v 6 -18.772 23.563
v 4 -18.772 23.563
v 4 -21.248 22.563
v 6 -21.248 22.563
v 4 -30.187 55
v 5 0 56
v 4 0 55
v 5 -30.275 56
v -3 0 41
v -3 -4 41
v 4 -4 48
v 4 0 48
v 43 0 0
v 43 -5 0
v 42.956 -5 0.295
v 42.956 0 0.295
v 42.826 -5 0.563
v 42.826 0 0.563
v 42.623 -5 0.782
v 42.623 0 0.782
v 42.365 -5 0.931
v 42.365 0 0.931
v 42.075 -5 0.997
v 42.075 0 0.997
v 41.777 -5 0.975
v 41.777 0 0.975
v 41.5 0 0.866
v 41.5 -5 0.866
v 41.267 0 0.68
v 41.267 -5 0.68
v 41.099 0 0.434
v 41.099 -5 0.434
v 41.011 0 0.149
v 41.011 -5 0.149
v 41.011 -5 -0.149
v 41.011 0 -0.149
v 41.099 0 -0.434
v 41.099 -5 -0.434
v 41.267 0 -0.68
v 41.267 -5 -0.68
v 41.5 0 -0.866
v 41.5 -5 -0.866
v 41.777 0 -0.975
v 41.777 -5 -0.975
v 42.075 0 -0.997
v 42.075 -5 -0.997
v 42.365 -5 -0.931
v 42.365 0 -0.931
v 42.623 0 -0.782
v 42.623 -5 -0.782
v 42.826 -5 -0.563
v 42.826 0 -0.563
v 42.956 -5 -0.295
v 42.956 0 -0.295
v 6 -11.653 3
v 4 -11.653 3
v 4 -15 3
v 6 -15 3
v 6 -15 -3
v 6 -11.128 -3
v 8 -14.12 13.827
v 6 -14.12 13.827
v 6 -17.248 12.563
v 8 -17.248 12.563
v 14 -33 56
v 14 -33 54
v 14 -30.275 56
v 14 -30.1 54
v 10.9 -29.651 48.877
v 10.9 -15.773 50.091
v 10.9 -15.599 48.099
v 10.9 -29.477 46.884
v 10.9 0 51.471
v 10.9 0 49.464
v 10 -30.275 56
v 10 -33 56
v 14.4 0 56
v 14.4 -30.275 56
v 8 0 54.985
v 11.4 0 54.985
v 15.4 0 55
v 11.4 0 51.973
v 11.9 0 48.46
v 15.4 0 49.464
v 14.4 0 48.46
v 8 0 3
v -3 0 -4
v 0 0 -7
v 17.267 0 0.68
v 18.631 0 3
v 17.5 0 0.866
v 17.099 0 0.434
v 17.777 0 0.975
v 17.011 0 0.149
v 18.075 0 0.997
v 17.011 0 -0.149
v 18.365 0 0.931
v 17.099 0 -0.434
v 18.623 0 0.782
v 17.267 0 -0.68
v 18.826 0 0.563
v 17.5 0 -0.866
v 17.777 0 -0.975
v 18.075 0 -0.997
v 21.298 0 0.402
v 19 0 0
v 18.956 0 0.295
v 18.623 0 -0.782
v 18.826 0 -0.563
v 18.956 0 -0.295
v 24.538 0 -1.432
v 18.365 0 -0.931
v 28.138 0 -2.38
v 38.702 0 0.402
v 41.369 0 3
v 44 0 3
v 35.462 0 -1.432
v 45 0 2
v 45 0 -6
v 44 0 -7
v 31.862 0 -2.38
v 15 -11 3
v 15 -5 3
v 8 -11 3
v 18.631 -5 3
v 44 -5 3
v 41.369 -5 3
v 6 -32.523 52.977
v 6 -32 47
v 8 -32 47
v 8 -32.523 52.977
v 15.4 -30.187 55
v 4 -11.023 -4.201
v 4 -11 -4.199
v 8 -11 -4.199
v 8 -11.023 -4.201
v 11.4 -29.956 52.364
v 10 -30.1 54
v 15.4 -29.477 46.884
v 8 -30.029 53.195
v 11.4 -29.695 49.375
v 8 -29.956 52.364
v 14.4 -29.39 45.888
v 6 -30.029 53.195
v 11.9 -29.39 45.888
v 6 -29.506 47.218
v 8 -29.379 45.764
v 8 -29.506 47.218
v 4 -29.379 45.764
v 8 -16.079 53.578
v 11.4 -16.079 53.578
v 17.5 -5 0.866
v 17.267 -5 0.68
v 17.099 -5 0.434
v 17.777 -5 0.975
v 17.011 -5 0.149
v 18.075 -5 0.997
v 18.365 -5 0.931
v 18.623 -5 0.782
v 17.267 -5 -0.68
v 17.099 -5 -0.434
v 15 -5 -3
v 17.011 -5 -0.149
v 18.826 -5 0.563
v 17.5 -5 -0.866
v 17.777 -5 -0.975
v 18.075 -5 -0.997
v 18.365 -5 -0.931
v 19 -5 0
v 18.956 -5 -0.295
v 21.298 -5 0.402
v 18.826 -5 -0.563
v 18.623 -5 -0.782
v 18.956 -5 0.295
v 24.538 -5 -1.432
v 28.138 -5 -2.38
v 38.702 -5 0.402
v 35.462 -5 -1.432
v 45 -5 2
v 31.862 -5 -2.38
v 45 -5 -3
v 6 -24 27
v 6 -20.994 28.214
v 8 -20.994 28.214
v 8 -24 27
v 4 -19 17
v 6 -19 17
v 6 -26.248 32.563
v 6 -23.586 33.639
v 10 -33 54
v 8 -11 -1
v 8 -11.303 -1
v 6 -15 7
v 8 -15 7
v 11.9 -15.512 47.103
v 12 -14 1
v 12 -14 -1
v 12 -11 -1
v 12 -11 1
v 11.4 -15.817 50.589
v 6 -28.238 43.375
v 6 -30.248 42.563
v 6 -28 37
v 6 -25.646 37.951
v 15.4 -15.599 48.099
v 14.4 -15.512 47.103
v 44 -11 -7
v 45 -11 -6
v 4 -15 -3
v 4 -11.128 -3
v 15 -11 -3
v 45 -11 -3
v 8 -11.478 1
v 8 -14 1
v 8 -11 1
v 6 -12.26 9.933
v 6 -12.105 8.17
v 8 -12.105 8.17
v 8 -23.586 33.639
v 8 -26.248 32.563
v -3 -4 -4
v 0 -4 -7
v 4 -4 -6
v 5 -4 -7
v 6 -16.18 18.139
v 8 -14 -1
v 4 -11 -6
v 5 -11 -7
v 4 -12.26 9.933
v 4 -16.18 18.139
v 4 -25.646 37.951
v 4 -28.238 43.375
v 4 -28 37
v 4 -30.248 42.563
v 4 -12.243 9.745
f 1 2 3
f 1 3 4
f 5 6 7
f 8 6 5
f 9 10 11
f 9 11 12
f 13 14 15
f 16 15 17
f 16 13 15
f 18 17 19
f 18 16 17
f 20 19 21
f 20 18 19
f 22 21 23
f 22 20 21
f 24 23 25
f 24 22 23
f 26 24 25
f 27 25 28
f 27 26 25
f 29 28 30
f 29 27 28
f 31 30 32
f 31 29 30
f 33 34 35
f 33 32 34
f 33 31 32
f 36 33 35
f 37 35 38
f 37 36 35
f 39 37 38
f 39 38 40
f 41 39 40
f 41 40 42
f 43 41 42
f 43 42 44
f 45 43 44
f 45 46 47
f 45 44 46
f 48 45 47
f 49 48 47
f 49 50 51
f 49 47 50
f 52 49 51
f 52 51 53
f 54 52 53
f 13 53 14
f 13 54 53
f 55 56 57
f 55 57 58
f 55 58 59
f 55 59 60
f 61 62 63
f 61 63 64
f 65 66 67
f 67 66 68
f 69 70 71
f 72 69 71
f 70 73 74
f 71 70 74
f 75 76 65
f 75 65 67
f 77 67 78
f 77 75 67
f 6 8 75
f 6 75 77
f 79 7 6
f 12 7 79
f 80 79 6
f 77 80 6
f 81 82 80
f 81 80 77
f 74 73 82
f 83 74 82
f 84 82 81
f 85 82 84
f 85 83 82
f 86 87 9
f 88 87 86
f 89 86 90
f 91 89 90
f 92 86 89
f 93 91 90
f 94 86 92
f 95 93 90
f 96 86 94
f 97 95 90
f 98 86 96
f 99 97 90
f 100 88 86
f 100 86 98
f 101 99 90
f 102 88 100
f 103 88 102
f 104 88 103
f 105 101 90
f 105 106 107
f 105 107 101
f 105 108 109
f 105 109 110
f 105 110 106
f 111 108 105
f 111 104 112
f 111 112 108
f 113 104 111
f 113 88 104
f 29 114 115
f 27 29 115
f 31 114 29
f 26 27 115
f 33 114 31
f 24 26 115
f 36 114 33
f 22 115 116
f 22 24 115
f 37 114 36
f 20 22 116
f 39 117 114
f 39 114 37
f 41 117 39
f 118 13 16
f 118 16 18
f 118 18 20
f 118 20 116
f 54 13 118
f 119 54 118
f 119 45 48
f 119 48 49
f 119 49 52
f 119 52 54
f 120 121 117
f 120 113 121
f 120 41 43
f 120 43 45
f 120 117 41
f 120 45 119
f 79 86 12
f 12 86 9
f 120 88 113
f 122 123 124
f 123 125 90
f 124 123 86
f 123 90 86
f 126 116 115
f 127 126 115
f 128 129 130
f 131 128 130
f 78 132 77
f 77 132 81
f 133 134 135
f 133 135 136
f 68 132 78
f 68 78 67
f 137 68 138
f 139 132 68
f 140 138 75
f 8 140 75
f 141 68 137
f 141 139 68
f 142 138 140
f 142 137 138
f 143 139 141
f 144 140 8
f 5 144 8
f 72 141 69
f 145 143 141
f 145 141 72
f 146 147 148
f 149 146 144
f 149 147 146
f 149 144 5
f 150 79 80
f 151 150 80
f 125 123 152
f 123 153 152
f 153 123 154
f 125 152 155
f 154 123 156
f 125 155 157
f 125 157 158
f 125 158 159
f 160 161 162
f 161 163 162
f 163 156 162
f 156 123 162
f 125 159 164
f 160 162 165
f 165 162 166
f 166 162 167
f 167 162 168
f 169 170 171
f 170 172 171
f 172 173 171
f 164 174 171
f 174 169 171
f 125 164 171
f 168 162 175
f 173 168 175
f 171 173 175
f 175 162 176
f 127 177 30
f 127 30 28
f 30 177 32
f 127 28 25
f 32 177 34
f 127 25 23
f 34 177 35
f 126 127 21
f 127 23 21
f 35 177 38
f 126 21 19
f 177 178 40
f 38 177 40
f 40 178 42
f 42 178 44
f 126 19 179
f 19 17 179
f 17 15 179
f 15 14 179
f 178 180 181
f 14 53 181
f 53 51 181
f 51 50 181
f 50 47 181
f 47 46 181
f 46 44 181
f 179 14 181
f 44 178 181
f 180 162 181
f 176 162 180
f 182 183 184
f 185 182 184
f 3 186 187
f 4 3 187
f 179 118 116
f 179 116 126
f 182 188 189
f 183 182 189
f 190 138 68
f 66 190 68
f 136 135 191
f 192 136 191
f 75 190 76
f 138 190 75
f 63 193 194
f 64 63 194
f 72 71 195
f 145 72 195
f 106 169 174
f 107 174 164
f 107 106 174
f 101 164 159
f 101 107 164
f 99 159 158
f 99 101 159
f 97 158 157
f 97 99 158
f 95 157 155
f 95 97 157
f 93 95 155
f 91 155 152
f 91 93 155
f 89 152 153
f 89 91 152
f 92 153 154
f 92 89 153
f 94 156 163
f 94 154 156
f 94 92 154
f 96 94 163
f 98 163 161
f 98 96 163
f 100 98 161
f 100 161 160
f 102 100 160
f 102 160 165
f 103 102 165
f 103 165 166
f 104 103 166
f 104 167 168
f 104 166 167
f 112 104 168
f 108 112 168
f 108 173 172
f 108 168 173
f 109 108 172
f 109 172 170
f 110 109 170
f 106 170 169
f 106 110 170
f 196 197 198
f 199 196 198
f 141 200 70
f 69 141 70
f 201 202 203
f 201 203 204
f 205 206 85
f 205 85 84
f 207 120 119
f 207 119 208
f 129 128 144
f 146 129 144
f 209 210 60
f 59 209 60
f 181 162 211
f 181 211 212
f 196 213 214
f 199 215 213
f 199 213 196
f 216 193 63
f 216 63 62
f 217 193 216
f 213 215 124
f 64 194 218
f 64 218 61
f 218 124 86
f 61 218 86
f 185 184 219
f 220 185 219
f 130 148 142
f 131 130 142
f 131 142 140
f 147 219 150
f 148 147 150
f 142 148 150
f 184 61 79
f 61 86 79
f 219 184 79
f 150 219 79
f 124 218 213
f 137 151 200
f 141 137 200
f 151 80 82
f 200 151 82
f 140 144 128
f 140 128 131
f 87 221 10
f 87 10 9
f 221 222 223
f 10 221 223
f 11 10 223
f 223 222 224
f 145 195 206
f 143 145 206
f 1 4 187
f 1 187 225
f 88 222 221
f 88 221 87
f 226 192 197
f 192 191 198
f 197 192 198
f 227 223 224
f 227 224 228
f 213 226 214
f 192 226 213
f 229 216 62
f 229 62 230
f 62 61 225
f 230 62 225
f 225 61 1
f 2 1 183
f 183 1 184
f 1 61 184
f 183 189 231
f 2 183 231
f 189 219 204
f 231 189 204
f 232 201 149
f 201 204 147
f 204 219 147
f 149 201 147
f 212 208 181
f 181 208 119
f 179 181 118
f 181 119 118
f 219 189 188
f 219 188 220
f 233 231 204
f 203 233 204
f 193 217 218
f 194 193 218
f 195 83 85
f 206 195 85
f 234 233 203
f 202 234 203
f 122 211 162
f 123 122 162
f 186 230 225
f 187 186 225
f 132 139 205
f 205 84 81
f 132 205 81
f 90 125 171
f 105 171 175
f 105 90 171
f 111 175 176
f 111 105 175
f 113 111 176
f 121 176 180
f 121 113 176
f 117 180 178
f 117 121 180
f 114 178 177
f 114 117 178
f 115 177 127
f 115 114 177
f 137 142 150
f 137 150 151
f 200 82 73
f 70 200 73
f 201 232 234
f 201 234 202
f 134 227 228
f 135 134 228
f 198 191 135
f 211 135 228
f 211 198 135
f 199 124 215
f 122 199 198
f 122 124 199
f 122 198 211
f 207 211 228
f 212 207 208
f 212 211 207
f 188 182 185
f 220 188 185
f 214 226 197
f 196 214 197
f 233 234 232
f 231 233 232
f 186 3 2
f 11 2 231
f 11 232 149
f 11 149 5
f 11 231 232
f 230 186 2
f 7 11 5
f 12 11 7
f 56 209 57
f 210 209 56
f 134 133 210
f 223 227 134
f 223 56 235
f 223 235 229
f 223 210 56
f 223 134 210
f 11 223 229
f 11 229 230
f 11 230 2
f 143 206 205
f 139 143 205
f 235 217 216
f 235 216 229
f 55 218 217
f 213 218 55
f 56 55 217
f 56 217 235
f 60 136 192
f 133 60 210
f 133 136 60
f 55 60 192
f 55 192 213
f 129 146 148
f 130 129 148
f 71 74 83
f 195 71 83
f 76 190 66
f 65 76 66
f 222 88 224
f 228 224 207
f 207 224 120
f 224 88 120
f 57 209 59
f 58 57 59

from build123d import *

# Parameters (mm, degrees)
BOX012_W             = 10
BOX012_H             = 4
BOX012_DEPTH         = 55
CHAMFER008_SIZE      = 7
CHAMFER009_SIZE      = 3
BOX005_W             = 4
BOX005_H             = 5
BOX005_DEPTH         = 2
BOX010_W             = 2
BOX010_H             = 5
BOX010_DEPTH         = 6
BOX010_ROLL_ANGLE    = 5
BOX007_W             = 2
BOX007_H             = 5
BOX007_DEPTH         = 6
BOX007_ROLL_ANGLE    = 22.0000000001
BOX011_W             = 4
BOX011_H             = 5
BOX011_DEPTH         = 2
BOX006_W             = 2
BOX006_H             = 5
BOX006_DEPTH         = 6
BOX009_W             = 2
BOX009_H             = 5
BOX009_DEPTH         = 6
BOX009_ROLL_ANGLE    = 22.0000000001
BOX008_W             = 2
BOX008_H             = 5
BOX008_DEPTH         = 6
BOX008_ROLL_ANGLE    = 22.0000000001
BOX004_W             = 2
BOX004_H             = 5
BOX004_DEPTH         = 6
BOX004_ROLL_ANGLE    = 22.0000000001
SKETCH002_W          = 34
SKETCH002_H          = 4
PAD001_DEPTH         = 30
EXTRUSION008_DEPTH   = 13.9308213426
BOX003_W             = 13
BOX003_H             = 10
BOX003_DEPTH         = 60
FACE006_W            = 8.14
FACE006_H            = 69.180787832
EXTRUSION006_DEPTH   = 0.4604923972
EXTRUSION005_DEPTH   = 8.14
FACE003_W            = 4
FACE003_H            = 14
EXTRUSION003_DEPTH   = 3.51
FACE004_W            = 3.51
FACE004_H            = 4
EXTRUSION004_DEPTH   = 69.180787832
FACE007_W            = 4
FACE007_H            = 69.180787832
EXTRUSION007_DEPTH   = 0.4131433628
FACE002_W            = 10
FACE002_H            = 4
EXTRUSION002_DEPTH   = 14
EXTRUSION_DEPTH      = 10
EXTRUSION001_DEPTH   = 10
FUSION001_ROLL_ANGLE = 5.0006445976
BOX002_W             = 13
BOX002_H             = 13
BOX002_DEPTH         = 49
BOX001_W             = 15
BOX001_H             = 11
BOX001_DEPTH         = 49
BOX_W                = 31
BOX_H                = 18
BOX_DEPTH            = 14
CYLINDER_R           = 14.5
CYLINDER_DEPTH       = 13
CYLINDER_ROLL_ANGLE  = 90.0000000001
SKETCH_R             = 1
PAD_DEPTH            = 11
CHAMFER_SIZE         = 1
CHAMFER001_SIZE      = 1
CHAMFER002_SIZE      = 1
CHAMFER003_SIZE      = 1
CHAMFER004_SIZE      = 1
CHAMFER005_SIZE      = 1
CHAMFER006_SIZE      = 1
EXTRUSION009_DEPTH   = 13.9308213426
POCKET_DEPTH         = 5
CHAMFER007_SIZE      = 1


with BuildPart() as fin002:
    # Box012 → Box012 (new body)
    with BuildSketch(Plane(origin=(-3, -4, -7), x_dir=(1, 0, 0), z_dir=(0, 0, 1))):
        with Locations((5, 2)):
            Rectangle(BOX012_W, BOX012_H)
    extrude(amount=BOX012_DEPTH)

    # Chamfer008
    chamfer008_edges = [fin002.edges().sort_by_distance(p)[0] for p in [
        (-3, -2, 48),
    ]]
    chamfer(chamfer008_edges, length=CHAMFER008_SIZE)

    # Chamfer009
    chamfer009_edges = [fin002.edges().sort_by_distance(p)[0] for p in [
        (-3, -2, -7),
    ]]
    chamfer(chamfer009_edges, length=CHAMFER009_SIZE)


with BuildPart() as cabletab001:
    # Box005 → Box005 (new body)
    with BuildSketch(Plane(origin=(8, -14, -1), x_dir=(1, 0, 0), z_dir=(0, 0, 1))):
        with Locations((2, 2.5)):
            Rectangle(BOX005_W, BOX005_H)
    extrude(amount=BOX005_DEPTH)


with BuildPart() as cabletab006:
    # Box010 → Box010 (new body)
    with BuildSketch(Plane.XY):
        with Locations((1, 2.5)):
            Rectangle(BOX010_W, BOX010_H)
    extrude(amount=BOX010_DEPTH)


with BuildPart() as cabletab006_1:
    # Box010 roll: moved
    add(cabletab006.part.rotate(Axis((0, 0, 0), (1, 0, 0)), BOX010_ROLL_ANGLE))


with BuildPart() as cabletab006_2:
    # Box010 placement: moved
    add(cabletab006_1.part.moved(Location((6, -32, 47))))


with BuildPart() as cabletab003:
    # Box007 → Box007 (new body)
    with BuildSketch(Plane.XY):
        with Locations((1, 2.5)):
            Rectangle(BOX007_W, BOX007_H)
    extrude(amount=BOX007_DEPTH)


with BuildPart() as cabletab003_1:
    # Box007 roll: moved
    add(cabletab003.part.rotate(Axis((0, 0, 0), (1, 0, 0)), BOX007_ROLL_ANGLE))


with BuildPart() as cabletab003_2:
    # Box007 placement: moved
    add(cabletab003_1.part.moved(Location((6, -24, 27))))


with BuildPart() as cabletab007:
    # Box011 → Box011 (new body)
    with BuildSketch(Plane(origin=(10, -33, 54), x_dir=(1, 0, 0), z_dir=(0, 0, 1))):
        with Locations((2, 2.5)):
            Rectangle(BOX011_W, BOX011_H)
    extrude(amount=BOX011_DEPTH)


with BuildPart() as cabletab002:
    # Box006 → Box006 (new body)
    with BuildSketch(Plane(origin=(4, -15, -3), x_dir=(1, 0, 0), z_dir=(0, 0, 1))):
        with Locations((1, 2.5)):
            Rectangle(BOX006_W, BOX006_H)
    extrude(amount=BOX006_DEPTH)


with BuildPart() as cabletab005:
    # Box009 → Box009 (new body)
    with BuildSketch(Plane.XY):
        with Locations((1, 2.5)):
            Rectangle(BOX009_W, BOX009_H)
    extrude(amount=BOX009_DEPTH)


with BuildPart() as cabletab005_1:
    # Box009 roll: moved
    add(cabletab005.part.rotate(Axis((0, 0, 0), (1, 0, 0)), BOX009_ROLL_ANGLE))


with BuildPart() as cabletab005_2:
    # Box009 placement: moved
    add(cabletab005_1.part.moved(Location((4, -28, 37))))


with BuildPart() as cabletab004:
    # Box008 → Box008 (new body)
    with BuildSketch(Plane.XY):
        with Locations((1, 2.5)):
            Rectangle(BOX008_W, BOX008_H)
    extrude(amount=BOX008_DEPTH)


with BuildPart() as cabletab004_1:
    # Box008 roll: moved
    add(cabletab004.part.rotate(Axis((0, 0, 0), (1, 0, 0)), BOX008_ROLL_ANGLE))


with BuildPart() as cabletab004_2:
    # Box008 placement: moved
    add(cabletab004_1.part.moved(Location((4, -19, 17))))


with BuildPart() as cabletabs:
    # Box004 → Box004 (new body)
    with BuildSketch(Plane.XY):
        with Locations((1, 2.5)):
            Rectangle(BOX004_W, BOX004_H)
    extrude(amount=BOX004_DEPTH)


with BuildPart() as cabletabs_1:
    # Box004 roll: moved
    add(cabletabs.part.rotate(Axis((0, 0, 0), (1, 0, 0)), BOX004_ROLL_ANGLE))


with BuildPart() as cabletabs_2:
    # Box004 placement: moved
    add(cabletabs_1.part.moved(Location((6, -15, 7))))

    # Fusion006: union cabletab001, cabletab006, cabletab003, cabletab007, cabletab002, cabletab005, cabletab004
    add(cabletab001.part)
    add(cabletab006_2.part)
    add(cabletab003_2.part)
    add(cabletab007.part)
    add(cabletab002.part)
    add(cabletab005_2.part)
    add(cabletab004_2.part)


with BuildPart() as pad001:
    # Sketch002 → Pad001 (new body)
    with BuildSketch(Plane.YZ):
        with Locations((-15, 58)):
            Rectangle(SKETCH002_W, SKETCH002_H)
    extrude(amount=PAD001_DEPTH)


with BuildPart() as extrusion008:
    # Face008 → Extrusion008 (new body)
    with BuildSketch(Plane(origin=(-17.578899357, -16.0333863028, 53.0614958622), x_dir=(-1, 0, 0), z_dir=(0, -0.9961937175, -0.0871669503))):
        Polygon((4.421100643, -4.5183191267), (4.421100643, -0.5183191267), (1.021100643, -0.5183191267), (1.021100643, 2.4816808733), (1.521100643, 2.9816808733), (1.521100643, 4.9816808733), (0.521100643, 5.9816808733), (-1.978899357, 5.9816808733), (-2.978899357, 4.9816808733), (-2.978899357, -3.5183191267), (-1.978899357, -4.5183191267), align=None)
    extrude(amount=EXTRUSION008_DEPTH)


with BuildPart() as cube003:
    # Box003 → Box003 (new body)
    with BuildSketch(Plane(origin=(-27, 0, 0), x_dir=(1, 0, 0), z_dir=(0, 0, 1))):
        with Locations((6.5, 5)):
            Rectangle(BOX003_W, BOX003_H)
    extrude(amount=BOX003_DEPTH)


with BuildPart() as extrusion006:
    # Face006 → Extrusion006 (new body)
    with BuildSketch(Plane(origin=(-17.93, -18.7549998831, 43.8980956594), x_dir=(-1, 0, 0), z_dir=(0, -0.9961937175, -0.0871669503))):
        Rectangle(FACE006_W, FACE006_H)
    extrude(amount=EXTRUSION006_DEPTH)


with BuildPart() as extrusion005:
    # Face005 → Extrusion005 (new body)
    with BuildSketch(Plane(origin=(-22, -17.0066799089, 44.0510736571), x_dir=(0, -1, 0), z_dir=(1, 0, 0))):
        Polygon((4.7634591209, -34.3057551071), (-1.2668191725, 34.6117111026), (-4.7634591209, 34.3057551071), (1.2668191725, -34.6117111026), align=None)
    extrude(amount=EXTRUSION005_DEPTH)


with BuildPart() as extrusion003:
    # Face003 → Extrusion003 (new body)
    with BuildSketch(Plane(origin=(-24, -15.1296920845, 2.4660065321), x_dir=(-1, 0, 0), z_dir=(0, -0.9961937175, -0.0871669503))):
        Rectangle(FACE003_W, FACE003_H)
    extrude(amount=-EXTRUSION003_DEPTH)


with BuildPart() as fusion002:
    # Face004 → Extrusion004 (new body)
    with BuildSketch(Plane(origin=(-24, -13.9915407622, 9.5923405523), x_dir=(0, 0.9961937175, 0.0871669503), z_dir=(0, -0.0871669503, 0.9961937175))):
        Rectangle(FACE004_W, FACE004_H)
    extrude(amount=EXTRUSION004_DEPTH)

    # Fusion002: union Extrusion003
    add(extrusion003.part)


with BuildPart() as fusion003:
    # Face007 → Extrusion007 (new body)
    with BuildSketch(Plane(origin=(-24, -18.7549998831, 43.8980956594), x_dir=(-1, 0, 0), z_dir=(0, -0.9961937175, -0.0871669503))):
        Rectangle(FACE007_W, FACE007_H)
    extrude(amount=EXTRUSION007_DEPTH)

    # Fusion003: union Extrusion006, Extrusion005, Fusion002
    add(extrusion006.part)
    add(extrusion005.part)
    add(fusion002.part)


with BuildPart() as extrusion002:
    # Face002 → Extrusion002 (new body)
    with BuildSketch(Plane(origin=(-24, -15, 11), x_dir=(0, -1, 0), z_dir=(0, 0, -1))):
        Rectangle(FACE002_W, FACE002_H)
    extrude(amount=EXTRUSION002_DEPTH)


with BuildPart() as extrusion:
    # Face → Extrusion (new body)
    with BuildSketch(Plane(origin=(-22.5493005697, -10, 39.3433444568), x_dir=(-1, 0, 0), z_dir=(0, -1, 0))):
        Polygon((3.4506994303, 28.3433444568), (-0.5493005697, 28.3433444568), (-0.5493005697, -15.6566555432), (-3.9493005697, -15.6566555432), (-3.9493005697, -12.6566555432), (-3.4493005697, -12.1566555432), (-3.4493005697, -10.1566555432), (-4.4493005697, -9.1566555432), (-6.9493005697, -9.1566555432), (-7.9493005697, -10.1566555432), (-7.9493005697, -18.6566555432), (-6.9493005697, -19.6566555432), (2.4506994303, -19.6566555432), (3.4506994303, -18.6566555432), align=None)
    extrude(amount=EXTRUSION_DEPTH)


with BuildPart() as cut005:
    # Face001 → Extrusion001 (new body)
    with BuildSketch(Plane(origin=(-22.5493005697, -10, 39.3433444568), x_dir=(1, 0, 0), z_dir=(0, 1, 0))):
        Polygon((0.5493005697, 28.3433444568), (-3.4506994303, 28.3433444568), (-3.4506994303, -18.6566555432), (-2.4506994303, -19.6566555432), (6.9493005697, -19.6566555432), (7.9493005697, -18.6566555432), (7.9493005697, -10.1566555432), (6.9493005697, -9.1566555432), (4.4493005697, -9.1566555432), (3.4493005697, -10.1566555432), (3.4493005697, -12.1566555432), (3.9493005697, -12.6566555432), (3.9493005697, -15.6566555432), (0.5493005697, -15.6566555432), align=None)
    extrude(amount=EXTRUSION001_DEPTH)

    # Fusion: union Extrusion
    add(extrusion.part)

    # Fusion001: union Extrusion002
    add(extrusion002.part)


with BuildPart() as cut005_1:
    # Fusion001 roll: moved
    add(cut005.part.rotate(Axis((0, 0, 0), (1, 0, 0)), FUSION001_ROLL_ANGLE))


with BuildPart() as cut005_2:
    # Fusion001 placement: moved
    add(cut005_1.part.moved(Location((0, 5.1428500666, 0.2245706677))))

    # Cut004: cut Fusion003
    add(fusion003.part, mode=Mode.SUBTRACT)

    # Cut005: cut Cube003
    add(cube003.part, mode=Mode.SUBTRACT)


with BuildPart() as cube002:
    # Box002 → Box002 (new body)
    with BuildSketch(Plane(origin=(-27, -12, 11), x_dir=(1, 0, 0), z_dir=(0, 0, 1))):
        with Locations((6.5, 6.5)):
            Rectangle(BOX002_W, BOX002_H)
    extrude(amount=BOX002_DEPTH)


with BuildPart() as cube001:
    # Box001 → Box001 (new body)
    with BuildSketch(Plane(origin=(-29, -21, 11), x_dir=(1, 0, 0), z_dir=(0, 0, 1))):
        with Locations((7.5, 5.5)):
            Rectangle(BOX001_W, BOX001_H)
    extrude(amount=BOX001_DEPTH)


with BuildPart() as cube:
    # Box → Box (new body)
    with BuildSketch(Plane(origin=(-15, -23, -3), x_dir=(1, 0, 0), z_dir=(0, 0, 1))):
        with Locations((15.5, 9)):
            Rectangle(BOX_W, BOX_H)
    extrude(amount=BOX_DEPTH)


with BuildPart() as cylinder:
    # Cylinder → Cylinder (new body)
    with BuildSketch(Plane.XY):
        Circle(CYLINDER_R)
    extrude(amount=CYLINDER_DEPTH)


with BuildPart() as cylinder_1:
    # Cylinder roll: moved
    add(cylinder.part.rotate(Axis((0, 0, 0), (1, 0, 0)), CYLINDER_ROLL_ANGLE))


with BuildPart() as cylinder_2:
    # Cylinder placement: moved
    add(cylinder_1.part.moved(Location((0, 1, 12))))


with BuildPart() as fusion004:
    # Sketch → Pad (new body)
    with BuildSketch(Plane.XZ):
        Polygon((15, -7), (15, 3), (-22, 3), (-22, 55), (-18.6, 55), (-18.6, 52), (-19.1, 51.5), (-19.1, 48.5), (-14.6, 48.5), (-14.6, 59), (-26, 59), (-26, -7), align=None)
        with Locations((-12, 0)):
            Circle(SKETCH_R, mode=Mode.SUBTRACT)
        with Locations((12, 0)):
            Circle(SKETCH_R, mode=Mode.SUBTRACT)
    extrude(amount=PAD_DEPTH)

    # Cut: cut Cylinder
    add(cylinder_2.part, mode=Mode.SUBTRACT)

    # Cut001: cut Cube
    add(cube.part, mode=Mode.SUBTRACT)

    # Chamfer
    chamfer_edges = [fusion004.edges().sort_by_distance(p)[0] for p in [
        (15, -5.5, -7),
    ]]
    chamfer(chamfer_edges, length=CHAMFER_SIZE)

    # Chamfer001
    chamfer001_edges = [fusion004.edges().sort_by_distance(p)[0] for p in [
        (-26, -5.5, -7),
    ]]
    chamfer(chamfer001_edges, length=CHAMFER001_SIZE)

    # Chamfer002
    chamfer002_edges = [fusion004.edges().sort_by_distance(p)[0] for p in [
        (-26, -5.5, 59),
    ]]
    chamfer(chamfer002_edges, length=CHAMFER002_SIZE)

    # Chamfer003
    chamfer003_edges = [fusion004.edges().sort_by_distance(p)[0] for p in [
        (-14.6, -5.5, 59),
    ]]
    chamfer(chamfer003_edges, length=CHAMFER003_SIZE)

    # Chamfer004
    chamfer004_edges = [fusion004.edges().sort_by_distance(p)[0] for p in [
        (-14.6, -5.5, 48.5),
    ]]
    chamfer(chamfer004_edges, length=CHAMFER004_SIZE)

    # Chamfer005
    chamfer005_edges = [fusion004.edges().sort_by_distance(p)[0] for p in [
        (-19.1, -5.5, 48.5),
    ]]
    chamfer(chamfer005_edges, length=CHAMFER005_SIZE)

    # Chamfer006
    chamfer006_edges = [fusion004.edges().sort_by_distance(p)[0] for p in [
        (15, -2.5, 3),
    ]]
    chamfer(chamfer006_edges, length=CHAMFER006_SIZE)

    # Cut002: cut Cube001
    add(cube001.part, mode=Mode.SUBTRACT)

    # Cut003: cut Cube002
    add(cube002.part, mode=Mode.SUBTRACT)

    # Fusion004: union Cut005
    add(cut005_2.part)


with BuildPart() as fusion007:
    # Face009 → Extrusion009 (new body)
    with BuildSketch(Plane(origin=(-23.9956483899, -14.3298412993, 33.5924101077), x_dir=(-1, 0, 0), z_dir=(0, -0.9961937175, -0.0871669503))):
        Polygon((2.0043516101, 23.9382071366), (-1.9956483899, 23.9382071366), (-1.9956483899, -20.0617928634), (-1.9956483899, -24.0617928634), (1.0043516101, -24.0617928634), (2.0043516101, -23.0617928634), align=None)
    extrude(amount=EXTRUSION009_DEPTH)

    # Sketch001 → Pocket (cut)
    with BuildSketch(Plane.YZ.offset(-22)):
        Polygon((-12.153362, 9.710751), (-30, 47.063831), (-30, 0), align=None)
    extrude(amount=-POCKET_DEPTH, mode=Mode.SUBTRACT)

    # Fusion005: union Extrusion008, Fusion004
    add(extrusion008.part)
    add(fusion004.part)


with BuildPart() as fusion007_1:
    # Fusion005 placement: moved
    add(fusion007.part.moved(Location((30, 0, 0))))

    # Cut006: cut Pad001
    add(pad001.part, mode=Mode.SUBTRACT)

    # Chamfer007
    chamfer007_edges = [fusion007_1.edges().sort_by_distance(p)[0] for p in [
        (4, -11.406738, 56),
        (15.4, -11.406738, 56),
    ]]
    chamfer(chamfer007_edges, length=CHAMFER007_SIZE)

    # Fusion007: union fin002, cabletabs
    add(fin002.part)
    add(cabletabs_2.part)


solid = fusion007_1.part
